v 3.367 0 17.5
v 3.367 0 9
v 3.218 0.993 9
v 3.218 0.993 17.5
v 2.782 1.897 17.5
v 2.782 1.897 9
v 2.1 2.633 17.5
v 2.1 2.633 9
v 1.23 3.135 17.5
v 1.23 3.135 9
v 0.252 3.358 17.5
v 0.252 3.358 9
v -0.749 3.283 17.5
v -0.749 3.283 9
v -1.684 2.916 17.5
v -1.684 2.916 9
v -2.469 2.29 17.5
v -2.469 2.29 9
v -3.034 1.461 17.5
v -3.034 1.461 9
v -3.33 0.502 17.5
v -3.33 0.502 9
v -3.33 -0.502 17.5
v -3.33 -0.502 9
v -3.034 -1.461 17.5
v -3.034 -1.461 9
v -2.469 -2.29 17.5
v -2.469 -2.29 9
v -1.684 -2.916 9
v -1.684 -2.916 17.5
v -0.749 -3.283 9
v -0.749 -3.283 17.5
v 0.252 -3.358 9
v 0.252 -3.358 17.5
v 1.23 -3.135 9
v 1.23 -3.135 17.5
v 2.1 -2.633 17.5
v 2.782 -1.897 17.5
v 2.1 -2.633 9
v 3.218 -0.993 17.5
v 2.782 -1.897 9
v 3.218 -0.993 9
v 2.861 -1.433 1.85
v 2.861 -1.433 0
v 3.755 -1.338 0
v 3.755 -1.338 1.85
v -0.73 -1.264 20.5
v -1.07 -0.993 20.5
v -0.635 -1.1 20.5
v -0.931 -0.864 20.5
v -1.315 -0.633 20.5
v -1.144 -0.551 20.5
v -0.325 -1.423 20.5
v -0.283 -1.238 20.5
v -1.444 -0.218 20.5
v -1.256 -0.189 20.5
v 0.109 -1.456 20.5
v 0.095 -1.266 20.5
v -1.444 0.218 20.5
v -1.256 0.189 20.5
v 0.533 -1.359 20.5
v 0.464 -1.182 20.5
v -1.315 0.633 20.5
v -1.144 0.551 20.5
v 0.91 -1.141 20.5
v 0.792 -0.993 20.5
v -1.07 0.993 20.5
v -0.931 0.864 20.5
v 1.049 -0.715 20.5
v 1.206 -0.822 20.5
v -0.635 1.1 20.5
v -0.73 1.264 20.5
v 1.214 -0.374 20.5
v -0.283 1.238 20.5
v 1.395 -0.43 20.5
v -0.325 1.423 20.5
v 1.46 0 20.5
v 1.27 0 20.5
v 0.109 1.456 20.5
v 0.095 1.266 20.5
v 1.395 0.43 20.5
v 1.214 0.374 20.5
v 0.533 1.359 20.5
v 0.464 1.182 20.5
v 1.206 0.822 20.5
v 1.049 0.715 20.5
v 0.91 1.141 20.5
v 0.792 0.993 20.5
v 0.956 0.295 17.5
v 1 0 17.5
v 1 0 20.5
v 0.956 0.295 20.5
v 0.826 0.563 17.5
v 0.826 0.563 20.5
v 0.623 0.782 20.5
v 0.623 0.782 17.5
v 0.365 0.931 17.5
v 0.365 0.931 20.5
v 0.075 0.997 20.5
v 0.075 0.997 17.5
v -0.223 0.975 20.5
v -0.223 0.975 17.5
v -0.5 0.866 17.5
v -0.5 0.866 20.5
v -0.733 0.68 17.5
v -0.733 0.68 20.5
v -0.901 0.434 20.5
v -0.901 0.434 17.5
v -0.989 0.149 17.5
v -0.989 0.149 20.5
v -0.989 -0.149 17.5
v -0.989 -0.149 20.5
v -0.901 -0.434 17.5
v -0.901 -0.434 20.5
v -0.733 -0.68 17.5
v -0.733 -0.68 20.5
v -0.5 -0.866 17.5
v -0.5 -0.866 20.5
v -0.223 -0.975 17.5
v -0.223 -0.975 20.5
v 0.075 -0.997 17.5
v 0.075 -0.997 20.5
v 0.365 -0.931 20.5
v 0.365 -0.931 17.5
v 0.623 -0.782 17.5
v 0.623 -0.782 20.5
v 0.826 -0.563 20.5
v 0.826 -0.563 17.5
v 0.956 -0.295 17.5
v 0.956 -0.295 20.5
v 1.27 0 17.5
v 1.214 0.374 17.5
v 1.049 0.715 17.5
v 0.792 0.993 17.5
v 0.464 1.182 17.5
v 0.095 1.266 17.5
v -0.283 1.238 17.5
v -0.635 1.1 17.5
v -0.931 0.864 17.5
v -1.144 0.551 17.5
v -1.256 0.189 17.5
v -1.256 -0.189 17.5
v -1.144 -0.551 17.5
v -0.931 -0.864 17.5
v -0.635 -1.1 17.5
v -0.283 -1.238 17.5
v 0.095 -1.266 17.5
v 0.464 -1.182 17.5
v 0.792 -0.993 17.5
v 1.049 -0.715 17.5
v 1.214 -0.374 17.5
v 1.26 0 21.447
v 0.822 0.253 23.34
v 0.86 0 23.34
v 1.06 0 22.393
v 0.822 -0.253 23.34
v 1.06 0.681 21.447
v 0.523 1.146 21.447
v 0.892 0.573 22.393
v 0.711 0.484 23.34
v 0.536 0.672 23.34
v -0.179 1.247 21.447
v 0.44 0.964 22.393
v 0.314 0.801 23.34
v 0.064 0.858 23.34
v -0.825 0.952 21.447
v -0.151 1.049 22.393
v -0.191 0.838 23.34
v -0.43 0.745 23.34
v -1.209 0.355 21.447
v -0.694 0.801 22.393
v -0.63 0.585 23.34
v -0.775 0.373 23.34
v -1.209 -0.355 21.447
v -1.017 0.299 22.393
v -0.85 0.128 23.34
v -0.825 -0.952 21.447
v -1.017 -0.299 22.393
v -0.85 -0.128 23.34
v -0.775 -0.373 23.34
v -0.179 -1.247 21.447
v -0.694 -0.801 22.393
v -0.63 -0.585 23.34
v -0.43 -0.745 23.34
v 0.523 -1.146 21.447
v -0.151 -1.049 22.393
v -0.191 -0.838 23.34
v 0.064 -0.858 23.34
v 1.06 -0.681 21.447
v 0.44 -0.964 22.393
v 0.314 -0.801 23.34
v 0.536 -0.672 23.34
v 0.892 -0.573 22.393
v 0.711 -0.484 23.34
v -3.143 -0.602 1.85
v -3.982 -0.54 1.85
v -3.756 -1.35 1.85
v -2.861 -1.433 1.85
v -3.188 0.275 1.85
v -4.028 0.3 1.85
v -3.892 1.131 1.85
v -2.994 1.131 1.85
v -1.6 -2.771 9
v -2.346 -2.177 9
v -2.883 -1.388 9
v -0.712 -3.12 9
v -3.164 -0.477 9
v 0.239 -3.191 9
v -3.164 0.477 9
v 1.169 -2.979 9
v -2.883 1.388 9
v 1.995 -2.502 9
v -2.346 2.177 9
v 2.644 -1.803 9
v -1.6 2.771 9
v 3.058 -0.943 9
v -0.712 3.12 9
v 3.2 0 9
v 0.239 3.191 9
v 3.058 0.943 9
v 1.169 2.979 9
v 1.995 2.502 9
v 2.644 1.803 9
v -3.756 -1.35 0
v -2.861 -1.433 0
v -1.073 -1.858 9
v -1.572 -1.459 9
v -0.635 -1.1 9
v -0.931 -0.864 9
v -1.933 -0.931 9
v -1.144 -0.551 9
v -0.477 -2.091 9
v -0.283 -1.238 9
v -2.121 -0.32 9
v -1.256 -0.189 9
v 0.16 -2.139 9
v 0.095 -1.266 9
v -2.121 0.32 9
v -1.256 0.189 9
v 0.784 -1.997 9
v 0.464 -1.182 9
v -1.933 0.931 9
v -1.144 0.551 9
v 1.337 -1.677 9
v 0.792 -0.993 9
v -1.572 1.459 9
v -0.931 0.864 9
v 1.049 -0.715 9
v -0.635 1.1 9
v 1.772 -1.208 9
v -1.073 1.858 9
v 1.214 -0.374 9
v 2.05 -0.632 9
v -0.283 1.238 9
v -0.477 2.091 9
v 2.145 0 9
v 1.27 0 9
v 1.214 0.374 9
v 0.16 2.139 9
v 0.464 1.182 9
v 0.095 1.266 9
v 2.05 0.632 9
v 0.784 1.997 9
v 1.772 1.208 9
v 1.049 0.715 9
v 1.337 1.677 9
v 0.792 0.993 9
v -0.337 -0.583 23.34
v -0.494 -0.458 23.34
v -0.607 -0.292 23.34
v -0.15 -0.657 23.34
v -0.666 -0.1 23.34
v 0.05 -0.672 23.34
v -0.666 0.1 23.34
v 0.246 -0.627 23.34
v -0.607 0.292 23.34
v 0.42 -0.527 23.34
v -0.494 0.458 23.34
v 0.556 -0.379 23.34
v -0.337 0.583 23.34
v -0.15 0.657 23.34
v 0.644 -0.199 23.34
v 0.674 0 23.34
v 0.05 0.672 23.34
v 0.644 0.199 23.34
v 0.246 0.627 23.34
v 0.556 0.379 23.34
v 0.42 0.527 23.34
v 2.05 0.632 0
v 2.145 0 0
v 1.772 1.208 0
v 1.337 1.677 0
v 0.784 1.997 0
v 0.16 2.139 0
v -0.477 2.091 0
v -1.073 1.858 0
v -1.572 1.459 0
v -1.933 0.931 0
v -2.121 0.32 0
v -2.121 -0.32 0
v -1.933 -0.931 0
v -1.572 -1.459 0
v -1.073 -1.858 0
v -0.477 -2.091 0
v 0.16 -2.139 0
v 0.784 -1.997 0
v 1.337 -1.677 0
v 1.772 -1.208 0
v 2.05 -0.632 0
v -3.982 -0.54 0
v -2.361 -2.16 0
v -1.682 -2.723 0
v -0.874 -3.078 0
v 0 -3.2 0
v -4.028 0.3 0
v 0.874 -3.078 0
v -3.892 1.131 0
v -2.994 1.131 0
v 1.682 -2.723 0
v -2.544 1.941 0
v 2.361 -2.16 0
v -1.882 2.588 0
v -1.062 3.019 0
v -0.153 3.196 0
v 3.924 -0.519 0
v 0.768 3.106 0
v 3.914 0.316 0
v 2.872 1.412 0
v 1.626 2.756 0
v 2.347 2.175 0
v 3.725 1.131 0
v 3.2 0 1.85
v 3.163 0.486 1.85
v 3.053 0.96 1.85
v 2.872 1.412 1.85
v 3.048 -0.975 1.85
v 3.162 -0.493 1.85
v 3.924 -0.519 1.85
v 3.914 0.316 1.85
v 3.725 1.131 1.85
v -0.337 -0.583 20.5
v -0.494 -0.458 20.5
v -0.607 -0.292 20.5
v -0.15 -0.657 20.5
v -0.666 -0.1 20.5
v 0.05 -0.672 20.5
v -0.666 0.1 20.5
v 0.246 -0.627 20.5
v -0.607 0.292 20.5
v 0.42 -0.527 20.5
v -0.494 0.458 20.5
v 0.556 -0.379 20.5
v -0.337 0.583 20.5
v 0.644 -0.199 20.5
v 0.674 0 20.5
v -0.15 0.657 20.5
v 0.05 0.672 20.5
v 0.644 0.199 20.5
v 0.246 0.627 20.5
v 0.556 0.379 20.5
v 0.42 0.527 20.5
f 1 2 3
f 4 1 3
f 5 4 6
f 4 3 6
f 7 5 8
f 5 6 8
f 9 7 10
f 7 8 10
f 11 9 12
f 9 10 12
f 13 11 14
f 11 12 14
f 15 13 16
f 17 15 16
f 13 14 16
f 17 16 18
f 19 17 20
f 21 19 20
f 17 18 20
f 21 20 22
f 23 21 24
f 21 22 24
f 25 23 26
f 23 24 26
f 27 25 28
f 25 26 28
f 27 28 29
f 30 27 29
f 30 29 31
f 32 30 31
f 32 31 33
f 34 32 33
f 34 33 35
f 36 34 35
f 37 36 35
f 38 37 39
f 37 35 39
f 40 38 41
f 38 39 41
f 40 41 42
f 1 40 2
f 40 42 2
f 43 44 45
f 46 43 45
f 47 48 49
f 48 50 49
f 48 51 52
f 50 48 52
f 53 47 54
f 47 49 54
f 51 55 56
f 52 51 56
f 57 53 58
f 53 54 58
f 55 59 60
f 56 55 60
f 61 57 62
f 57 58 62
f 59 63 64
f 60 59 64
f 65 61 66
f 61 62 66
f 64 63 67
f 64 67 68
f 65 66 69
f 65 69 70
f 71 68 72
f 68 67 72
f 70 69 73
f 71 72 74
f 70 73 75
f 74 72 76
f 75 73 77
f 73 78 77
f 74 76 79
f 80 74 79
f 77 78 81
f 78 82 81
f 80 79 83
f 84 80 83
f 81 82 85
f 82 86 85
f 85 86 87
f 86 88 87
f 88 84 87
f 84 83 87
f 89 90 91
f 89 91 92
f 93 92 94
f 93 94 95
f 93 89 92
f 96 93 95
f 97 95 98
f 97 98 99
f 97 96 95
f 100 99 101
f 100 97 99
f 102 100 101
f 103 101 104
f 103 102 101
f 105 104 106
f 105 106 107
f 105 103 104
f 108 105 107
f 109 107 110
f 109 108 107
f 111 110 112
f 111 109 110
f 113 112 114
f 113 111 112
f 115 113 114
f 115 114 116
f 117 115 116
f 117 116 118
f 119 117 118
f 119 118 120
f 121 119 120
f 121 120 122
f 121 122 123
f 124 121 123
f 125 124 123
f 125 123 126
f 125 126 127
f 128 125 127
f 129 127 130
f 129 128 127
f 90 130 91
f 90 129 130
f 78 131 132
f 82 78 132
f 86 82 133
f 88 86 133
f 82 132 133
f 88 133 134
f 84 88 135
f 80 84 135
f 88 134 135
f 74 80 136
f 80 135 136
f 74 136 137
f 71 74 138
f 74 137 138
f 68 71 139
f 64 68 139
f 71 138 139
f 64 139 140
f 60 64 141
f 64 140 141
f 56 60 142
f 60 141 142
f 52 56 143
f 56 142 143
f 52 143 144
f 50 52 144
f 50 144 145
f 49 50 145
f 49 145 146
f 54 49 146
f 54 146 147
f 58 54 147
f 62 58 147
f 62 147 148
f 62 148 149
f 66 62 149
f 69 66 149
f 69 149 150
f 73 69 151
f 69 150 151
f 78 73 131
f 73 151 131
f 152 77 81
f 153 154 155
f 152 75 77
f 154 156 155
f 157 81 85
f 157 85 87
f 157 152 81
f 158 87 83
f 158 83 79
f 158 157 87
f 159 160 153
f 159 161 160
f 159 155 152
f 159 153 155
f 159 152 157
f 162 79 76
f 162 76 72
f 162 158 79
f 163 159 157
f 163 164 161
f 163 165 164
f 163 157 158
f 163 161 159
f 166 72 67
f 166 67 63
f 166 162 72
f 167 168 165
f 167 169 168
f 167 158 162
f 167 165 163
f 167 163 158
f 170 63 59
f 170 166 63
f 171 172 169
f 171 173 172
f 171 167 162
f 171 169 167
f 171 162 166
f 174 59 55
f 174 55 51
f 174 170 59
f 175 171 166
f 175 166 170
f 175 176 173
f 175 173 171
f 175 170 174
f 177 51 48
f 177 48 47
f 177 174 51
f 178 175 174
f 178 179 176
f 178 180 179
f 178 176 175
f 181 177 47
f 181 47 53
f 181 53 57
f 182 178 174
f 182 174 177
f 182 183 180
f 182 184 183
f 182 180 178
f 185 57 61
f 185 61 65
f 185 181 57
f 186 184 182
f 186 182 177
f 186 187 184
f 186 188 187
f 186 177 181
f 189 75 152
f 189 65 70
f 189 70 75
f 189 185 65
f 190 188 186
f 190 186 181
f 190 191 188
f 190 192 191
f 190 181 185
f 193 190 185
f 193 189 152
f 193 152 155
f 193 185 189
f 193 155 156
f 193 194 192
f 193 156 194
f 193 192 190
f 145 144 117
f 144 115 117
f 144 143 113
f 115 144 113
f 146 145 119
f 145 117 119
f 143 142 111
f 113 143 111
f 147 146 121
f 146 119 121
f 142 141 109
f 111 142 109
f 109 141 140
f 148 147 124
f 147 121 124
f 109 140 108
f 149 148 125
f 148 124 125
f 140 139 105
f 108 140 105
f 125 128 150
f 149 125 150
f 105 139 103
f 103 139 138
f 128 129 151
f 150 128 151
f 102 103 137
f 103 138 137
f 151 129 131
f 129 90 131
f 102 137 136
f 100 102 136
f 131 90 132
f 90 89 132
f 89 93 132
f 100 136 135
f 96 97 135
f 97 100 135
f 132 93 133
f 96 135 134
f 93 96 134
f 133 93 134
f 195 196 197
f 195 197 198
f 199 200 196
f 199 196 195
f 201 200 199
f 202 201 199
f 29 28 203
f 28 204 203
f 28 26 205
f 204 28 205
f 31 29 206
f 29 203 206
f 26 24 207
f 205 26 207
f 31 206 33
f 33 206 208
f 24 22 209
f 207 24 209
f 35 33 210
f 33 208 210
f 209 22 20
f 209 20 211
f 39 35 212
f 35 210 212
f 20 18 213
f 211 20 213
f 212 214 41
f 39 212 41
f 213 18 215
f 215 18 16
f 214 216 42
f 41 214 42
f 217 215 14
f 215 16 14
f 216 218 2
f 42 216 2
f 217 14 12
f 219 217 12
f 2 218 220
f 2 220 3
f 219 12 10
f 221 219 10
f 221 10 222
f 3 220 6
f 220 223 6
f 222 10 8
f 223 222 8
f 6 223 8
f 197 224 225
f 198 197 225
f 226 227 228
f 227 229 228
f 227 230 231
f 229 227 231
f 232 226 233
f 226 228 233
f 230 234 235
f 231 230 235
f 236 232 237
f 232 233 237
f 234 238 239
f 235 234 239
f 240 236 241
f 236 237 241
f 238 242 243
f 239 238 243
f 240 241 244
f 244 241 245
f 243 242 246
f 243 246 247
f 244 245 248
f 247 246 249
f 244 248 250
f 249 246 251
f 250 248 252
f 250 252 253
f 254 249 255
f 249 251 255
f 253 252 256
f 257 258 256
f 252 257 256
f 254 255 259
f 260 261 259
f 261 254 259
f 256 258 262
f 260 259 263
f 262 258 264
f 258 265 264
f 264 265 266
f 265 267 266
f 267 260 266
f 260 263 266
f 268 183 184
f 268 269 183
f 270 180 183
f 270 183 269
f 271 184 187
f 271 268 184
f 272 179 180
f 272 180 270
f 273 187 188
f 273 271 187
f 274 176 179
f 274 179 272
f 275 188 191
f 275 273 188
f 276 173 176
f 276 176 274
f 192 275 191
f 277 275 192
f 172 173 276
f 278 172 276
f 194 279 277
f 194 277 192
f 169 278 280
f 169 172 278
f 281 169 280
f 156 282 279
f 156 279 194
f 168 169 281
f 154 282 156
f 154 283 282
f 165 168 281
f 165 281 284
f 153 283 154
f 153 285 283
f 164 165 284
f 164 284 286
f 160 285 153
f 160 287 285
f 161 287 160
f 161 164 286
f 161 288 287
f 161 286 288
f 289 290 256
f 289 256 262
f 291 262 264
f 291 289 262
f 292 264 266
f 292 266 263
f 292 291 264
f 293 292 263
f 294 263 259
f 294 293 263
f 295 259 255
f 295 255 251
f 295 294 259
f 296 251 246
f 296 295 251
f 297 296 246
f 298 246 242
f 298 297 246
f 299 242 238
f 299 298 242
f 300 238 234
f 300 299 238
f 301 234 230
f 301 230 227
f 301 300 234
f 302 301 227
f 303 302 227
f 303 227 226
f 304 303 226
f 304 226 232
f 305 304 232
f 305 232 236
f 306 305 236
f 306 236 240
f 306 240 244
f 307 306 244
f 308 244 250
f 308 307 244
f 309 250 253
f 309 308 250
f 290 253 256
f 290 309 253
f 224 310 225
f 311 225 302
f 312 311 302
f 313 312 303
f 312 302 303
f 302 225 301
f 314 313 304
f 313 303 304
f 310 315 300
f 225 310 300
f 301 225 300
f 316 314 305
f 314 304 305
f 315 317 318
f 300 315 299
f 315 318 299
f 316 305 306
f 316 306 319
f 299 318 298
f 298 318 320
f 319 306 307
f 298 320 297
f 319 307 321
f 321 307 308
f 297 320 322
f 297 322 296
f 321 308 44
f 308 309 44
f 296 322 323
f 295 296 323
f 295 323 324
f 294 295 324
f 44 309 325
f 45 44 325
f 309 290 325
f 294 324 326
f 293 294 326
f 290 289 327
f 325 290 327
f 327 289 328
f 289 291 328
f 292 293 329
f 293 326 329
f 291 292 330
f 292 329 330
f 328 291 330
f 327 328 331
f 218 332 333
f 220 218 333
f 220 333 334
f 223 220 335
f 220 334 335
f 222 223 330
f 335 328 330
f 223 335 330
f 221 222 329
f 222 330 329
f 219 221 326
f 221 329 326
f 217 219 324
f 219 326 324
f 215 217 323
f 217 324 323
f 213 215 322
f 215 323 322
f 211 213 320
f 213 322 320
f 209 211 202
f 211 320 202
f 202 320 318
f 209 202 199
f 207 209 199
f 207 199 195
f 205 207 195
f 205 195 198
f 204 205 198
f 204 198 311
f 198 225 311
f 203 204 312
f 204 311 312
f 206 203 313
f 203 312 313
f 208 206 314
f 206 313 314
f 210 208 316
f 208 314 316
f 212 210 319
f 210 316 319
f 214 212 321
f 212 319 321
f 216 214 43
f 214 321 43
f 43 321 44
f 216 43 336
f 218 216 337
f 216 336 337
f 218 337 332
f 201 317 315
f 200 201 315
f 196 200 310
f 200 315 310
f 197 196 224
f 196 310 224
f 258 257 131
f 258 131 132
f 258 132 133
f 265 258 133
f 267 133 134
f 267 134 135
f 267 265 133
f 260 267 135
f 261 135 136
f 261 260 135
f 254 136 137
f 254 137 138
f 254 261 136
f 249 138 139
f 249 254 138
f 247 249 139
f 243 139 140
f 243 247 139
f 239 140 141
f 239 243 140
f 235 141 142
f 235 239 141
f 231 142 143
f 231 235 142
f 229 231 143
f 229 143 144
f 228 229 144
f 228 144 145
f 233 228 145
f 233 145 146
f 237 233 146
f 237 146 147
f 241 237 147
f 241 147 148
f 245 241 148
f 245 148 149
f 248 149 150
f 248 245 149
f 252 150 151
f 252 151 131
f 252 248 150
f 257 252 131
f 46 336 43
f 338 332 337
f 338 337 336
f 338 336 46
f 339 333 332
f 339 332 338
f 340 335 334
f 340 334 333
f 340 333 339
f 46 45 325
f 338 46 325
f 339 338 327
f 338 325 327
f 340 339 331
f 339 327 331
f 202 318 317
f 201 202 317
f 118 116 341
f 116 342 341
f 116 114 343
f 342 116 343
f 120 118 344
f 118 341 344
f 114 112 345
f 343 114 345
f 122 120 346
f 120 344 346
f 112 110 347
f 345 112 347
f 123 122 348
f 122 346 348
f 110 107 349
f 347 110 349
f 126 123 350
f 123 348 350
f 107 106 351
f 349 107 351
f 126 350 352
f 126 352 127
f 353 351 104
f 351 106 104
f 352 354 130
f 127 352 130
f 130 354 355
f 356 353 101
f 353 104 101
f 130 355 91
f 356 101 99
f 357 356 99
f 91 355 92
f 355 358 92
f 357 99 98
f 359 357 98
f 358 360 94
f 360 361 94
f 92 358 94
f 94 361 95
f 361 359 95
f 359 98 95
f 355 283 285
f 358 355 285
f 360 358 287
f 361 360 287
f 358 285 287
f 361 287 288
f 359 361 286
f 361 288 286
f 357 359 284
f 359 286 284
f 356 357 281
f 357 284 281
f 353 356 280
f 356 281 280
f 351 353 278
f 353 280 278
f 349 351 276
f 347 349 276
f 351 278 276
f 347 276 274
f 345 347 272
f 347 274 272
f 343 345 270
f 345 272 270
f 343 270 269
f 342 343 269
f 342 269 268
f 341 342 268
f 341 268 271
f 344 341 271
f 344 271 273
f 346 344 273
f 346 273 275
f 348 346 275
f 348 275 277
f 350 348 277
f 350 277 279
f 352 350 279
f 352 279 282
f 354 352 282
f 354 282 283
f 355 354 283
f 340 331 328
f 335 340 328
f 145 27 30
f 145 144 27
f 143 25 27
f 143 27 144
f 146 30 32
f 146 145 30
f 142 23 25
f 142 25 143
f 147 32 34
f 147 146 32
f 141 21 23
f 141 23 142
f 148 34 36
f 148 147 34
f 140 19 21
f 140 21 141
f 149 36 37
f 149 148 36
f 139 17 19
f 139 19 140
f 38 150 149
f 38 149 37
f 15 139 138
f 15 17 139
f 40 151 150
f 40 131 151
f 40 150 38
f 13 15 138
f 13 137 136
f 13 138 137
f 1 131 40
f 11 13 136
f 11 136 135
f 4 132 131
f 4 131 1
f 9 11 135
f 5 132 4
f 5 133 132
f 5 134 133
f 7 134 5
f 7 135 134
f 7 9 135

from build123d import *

# Parameters (mm, degrees)
SKETCH1_R           = 3.2
BOSS_EXTRUDE1_DEPTH = 9
SKETCH1_371_R       = 2.145
CUT_EXTRUDE7_DEPTH  = 9
SKETCH2_R           = 3.367447595
SKETCH2_R_2         = 1.27
BOSS_EXTRUDE3_DEPTH = 8.5
BOSS_EXTRUDE4_DEPTH = 1.85
SKETCH7_R           = 1.27
SKETCH7_R_2         = 1
BOSS_EXTRUDE5_DEPTH = 3
SKETCH9_R           = 1.46
SKETCH10_R          = 0.86
SKETCH11_R          = 0.673532446
CUT_EXTRUDE8_DEPTH  = 10


with BuildPart() as part:
    # Sketch1 → Boss-Extrude1 (new body)
    with BuildSketch(Plane.XY):
        Circle(SKETCH1_R)
    extrude(amount=BOSS_EXTRUDE1_DEPTH)

    # Sketch1<371> → Cut-Extrude7 (cut)
    with BuildSketch(Plane.XY):
        Circle(SKETCH1_371_R)
    extrude(amount=CUT_EXTRUDE7_DEPTH, mode=Mode.SUBTRACT)

    # Sketch2 → Boss-Extrude3 (add)
    with BuildSketch(Plane.XY.offset(9)):
        Circle(SKETCH2_R)
        Circle(SKETCH2_R_2, mode=Mode.SUBTRACT)
    extrude(amount=BOSS_EXTRUDE3_DEPTH)

    # Sketch1<372> → Boss-Extrude4 (add)
    with BuildSketch(Plane.XY):
        with BuildLine():
            ThreePointArc((-2.861318951, -1.432778371), (-3.195747329, -0.164921217), (-2.993607202, 1.130626341))
            Line((-2.993607202, 1.130626341), (-3.892248535, 1.130626341))
            ThreePointArc((-3.892248535, 1.130626341), (-4.027565176, -0.120880773), (-3.756146306, -1.350072559))
            Line((-3.756146306, -1.350072559), (-2.861318951, -1.432778371))
        make_face()
        with BuildLine():
            Line((3.72513828, 1.130626341), (2.871661811, 1.411934292))
            ThreePointArc((2.871661811, 1.411934292), (3.116834756, 0.724804183), (3.2, 0))
            ThreePointArc((3.2, 0), (3.114178916, -0.736131563), (2.861318951, -1.432778371))
            Line((2.861318951, -1.432778371), (3.754952726, -1.3380423))
            ThreePointArc((3.754952726, -1.3380423), (3.94108837, -0.101279958), (3.72513828, 1.130626341))
        make_face()
    extrude(amount=BOSS_EXTRUDE4_DEPTH)


with BuildPart() as body_2:
    # Sketch7 → Boss-Extrude5 (new body)
    with BuildSketch(Plane.XY.offset(17.5)):
        Circle(SKETCH7_R)
        Circle(SKETCH7_R_2, mode=Mode.SUBTRACT)
    extrude(amount=BOSS_EXTRUDE5_DEPTH)

    # Sketch9 → Loft1 section 0
    with BuildSketch(Plane.XY.offset(20.5)):
        Circle(SKETCH9_R)
    # Sketch10 → Loft1 section 1
    with BuildSketch(Plane.XY.offset(23.34)):
        Circle(SKETCH10_R)
    loft()

    # Sketch11 → Cut-Extrude8 (cut)
    with BuildSketch(Plane.XY.offset(23.34)):
        Circle(SKETCH11_R)
    extrude(amount=-CUT_EXTRUDE8_DEPTH, mode=Mode.SUBTRACT)


solid = Compound([part.part, body_2.part])
